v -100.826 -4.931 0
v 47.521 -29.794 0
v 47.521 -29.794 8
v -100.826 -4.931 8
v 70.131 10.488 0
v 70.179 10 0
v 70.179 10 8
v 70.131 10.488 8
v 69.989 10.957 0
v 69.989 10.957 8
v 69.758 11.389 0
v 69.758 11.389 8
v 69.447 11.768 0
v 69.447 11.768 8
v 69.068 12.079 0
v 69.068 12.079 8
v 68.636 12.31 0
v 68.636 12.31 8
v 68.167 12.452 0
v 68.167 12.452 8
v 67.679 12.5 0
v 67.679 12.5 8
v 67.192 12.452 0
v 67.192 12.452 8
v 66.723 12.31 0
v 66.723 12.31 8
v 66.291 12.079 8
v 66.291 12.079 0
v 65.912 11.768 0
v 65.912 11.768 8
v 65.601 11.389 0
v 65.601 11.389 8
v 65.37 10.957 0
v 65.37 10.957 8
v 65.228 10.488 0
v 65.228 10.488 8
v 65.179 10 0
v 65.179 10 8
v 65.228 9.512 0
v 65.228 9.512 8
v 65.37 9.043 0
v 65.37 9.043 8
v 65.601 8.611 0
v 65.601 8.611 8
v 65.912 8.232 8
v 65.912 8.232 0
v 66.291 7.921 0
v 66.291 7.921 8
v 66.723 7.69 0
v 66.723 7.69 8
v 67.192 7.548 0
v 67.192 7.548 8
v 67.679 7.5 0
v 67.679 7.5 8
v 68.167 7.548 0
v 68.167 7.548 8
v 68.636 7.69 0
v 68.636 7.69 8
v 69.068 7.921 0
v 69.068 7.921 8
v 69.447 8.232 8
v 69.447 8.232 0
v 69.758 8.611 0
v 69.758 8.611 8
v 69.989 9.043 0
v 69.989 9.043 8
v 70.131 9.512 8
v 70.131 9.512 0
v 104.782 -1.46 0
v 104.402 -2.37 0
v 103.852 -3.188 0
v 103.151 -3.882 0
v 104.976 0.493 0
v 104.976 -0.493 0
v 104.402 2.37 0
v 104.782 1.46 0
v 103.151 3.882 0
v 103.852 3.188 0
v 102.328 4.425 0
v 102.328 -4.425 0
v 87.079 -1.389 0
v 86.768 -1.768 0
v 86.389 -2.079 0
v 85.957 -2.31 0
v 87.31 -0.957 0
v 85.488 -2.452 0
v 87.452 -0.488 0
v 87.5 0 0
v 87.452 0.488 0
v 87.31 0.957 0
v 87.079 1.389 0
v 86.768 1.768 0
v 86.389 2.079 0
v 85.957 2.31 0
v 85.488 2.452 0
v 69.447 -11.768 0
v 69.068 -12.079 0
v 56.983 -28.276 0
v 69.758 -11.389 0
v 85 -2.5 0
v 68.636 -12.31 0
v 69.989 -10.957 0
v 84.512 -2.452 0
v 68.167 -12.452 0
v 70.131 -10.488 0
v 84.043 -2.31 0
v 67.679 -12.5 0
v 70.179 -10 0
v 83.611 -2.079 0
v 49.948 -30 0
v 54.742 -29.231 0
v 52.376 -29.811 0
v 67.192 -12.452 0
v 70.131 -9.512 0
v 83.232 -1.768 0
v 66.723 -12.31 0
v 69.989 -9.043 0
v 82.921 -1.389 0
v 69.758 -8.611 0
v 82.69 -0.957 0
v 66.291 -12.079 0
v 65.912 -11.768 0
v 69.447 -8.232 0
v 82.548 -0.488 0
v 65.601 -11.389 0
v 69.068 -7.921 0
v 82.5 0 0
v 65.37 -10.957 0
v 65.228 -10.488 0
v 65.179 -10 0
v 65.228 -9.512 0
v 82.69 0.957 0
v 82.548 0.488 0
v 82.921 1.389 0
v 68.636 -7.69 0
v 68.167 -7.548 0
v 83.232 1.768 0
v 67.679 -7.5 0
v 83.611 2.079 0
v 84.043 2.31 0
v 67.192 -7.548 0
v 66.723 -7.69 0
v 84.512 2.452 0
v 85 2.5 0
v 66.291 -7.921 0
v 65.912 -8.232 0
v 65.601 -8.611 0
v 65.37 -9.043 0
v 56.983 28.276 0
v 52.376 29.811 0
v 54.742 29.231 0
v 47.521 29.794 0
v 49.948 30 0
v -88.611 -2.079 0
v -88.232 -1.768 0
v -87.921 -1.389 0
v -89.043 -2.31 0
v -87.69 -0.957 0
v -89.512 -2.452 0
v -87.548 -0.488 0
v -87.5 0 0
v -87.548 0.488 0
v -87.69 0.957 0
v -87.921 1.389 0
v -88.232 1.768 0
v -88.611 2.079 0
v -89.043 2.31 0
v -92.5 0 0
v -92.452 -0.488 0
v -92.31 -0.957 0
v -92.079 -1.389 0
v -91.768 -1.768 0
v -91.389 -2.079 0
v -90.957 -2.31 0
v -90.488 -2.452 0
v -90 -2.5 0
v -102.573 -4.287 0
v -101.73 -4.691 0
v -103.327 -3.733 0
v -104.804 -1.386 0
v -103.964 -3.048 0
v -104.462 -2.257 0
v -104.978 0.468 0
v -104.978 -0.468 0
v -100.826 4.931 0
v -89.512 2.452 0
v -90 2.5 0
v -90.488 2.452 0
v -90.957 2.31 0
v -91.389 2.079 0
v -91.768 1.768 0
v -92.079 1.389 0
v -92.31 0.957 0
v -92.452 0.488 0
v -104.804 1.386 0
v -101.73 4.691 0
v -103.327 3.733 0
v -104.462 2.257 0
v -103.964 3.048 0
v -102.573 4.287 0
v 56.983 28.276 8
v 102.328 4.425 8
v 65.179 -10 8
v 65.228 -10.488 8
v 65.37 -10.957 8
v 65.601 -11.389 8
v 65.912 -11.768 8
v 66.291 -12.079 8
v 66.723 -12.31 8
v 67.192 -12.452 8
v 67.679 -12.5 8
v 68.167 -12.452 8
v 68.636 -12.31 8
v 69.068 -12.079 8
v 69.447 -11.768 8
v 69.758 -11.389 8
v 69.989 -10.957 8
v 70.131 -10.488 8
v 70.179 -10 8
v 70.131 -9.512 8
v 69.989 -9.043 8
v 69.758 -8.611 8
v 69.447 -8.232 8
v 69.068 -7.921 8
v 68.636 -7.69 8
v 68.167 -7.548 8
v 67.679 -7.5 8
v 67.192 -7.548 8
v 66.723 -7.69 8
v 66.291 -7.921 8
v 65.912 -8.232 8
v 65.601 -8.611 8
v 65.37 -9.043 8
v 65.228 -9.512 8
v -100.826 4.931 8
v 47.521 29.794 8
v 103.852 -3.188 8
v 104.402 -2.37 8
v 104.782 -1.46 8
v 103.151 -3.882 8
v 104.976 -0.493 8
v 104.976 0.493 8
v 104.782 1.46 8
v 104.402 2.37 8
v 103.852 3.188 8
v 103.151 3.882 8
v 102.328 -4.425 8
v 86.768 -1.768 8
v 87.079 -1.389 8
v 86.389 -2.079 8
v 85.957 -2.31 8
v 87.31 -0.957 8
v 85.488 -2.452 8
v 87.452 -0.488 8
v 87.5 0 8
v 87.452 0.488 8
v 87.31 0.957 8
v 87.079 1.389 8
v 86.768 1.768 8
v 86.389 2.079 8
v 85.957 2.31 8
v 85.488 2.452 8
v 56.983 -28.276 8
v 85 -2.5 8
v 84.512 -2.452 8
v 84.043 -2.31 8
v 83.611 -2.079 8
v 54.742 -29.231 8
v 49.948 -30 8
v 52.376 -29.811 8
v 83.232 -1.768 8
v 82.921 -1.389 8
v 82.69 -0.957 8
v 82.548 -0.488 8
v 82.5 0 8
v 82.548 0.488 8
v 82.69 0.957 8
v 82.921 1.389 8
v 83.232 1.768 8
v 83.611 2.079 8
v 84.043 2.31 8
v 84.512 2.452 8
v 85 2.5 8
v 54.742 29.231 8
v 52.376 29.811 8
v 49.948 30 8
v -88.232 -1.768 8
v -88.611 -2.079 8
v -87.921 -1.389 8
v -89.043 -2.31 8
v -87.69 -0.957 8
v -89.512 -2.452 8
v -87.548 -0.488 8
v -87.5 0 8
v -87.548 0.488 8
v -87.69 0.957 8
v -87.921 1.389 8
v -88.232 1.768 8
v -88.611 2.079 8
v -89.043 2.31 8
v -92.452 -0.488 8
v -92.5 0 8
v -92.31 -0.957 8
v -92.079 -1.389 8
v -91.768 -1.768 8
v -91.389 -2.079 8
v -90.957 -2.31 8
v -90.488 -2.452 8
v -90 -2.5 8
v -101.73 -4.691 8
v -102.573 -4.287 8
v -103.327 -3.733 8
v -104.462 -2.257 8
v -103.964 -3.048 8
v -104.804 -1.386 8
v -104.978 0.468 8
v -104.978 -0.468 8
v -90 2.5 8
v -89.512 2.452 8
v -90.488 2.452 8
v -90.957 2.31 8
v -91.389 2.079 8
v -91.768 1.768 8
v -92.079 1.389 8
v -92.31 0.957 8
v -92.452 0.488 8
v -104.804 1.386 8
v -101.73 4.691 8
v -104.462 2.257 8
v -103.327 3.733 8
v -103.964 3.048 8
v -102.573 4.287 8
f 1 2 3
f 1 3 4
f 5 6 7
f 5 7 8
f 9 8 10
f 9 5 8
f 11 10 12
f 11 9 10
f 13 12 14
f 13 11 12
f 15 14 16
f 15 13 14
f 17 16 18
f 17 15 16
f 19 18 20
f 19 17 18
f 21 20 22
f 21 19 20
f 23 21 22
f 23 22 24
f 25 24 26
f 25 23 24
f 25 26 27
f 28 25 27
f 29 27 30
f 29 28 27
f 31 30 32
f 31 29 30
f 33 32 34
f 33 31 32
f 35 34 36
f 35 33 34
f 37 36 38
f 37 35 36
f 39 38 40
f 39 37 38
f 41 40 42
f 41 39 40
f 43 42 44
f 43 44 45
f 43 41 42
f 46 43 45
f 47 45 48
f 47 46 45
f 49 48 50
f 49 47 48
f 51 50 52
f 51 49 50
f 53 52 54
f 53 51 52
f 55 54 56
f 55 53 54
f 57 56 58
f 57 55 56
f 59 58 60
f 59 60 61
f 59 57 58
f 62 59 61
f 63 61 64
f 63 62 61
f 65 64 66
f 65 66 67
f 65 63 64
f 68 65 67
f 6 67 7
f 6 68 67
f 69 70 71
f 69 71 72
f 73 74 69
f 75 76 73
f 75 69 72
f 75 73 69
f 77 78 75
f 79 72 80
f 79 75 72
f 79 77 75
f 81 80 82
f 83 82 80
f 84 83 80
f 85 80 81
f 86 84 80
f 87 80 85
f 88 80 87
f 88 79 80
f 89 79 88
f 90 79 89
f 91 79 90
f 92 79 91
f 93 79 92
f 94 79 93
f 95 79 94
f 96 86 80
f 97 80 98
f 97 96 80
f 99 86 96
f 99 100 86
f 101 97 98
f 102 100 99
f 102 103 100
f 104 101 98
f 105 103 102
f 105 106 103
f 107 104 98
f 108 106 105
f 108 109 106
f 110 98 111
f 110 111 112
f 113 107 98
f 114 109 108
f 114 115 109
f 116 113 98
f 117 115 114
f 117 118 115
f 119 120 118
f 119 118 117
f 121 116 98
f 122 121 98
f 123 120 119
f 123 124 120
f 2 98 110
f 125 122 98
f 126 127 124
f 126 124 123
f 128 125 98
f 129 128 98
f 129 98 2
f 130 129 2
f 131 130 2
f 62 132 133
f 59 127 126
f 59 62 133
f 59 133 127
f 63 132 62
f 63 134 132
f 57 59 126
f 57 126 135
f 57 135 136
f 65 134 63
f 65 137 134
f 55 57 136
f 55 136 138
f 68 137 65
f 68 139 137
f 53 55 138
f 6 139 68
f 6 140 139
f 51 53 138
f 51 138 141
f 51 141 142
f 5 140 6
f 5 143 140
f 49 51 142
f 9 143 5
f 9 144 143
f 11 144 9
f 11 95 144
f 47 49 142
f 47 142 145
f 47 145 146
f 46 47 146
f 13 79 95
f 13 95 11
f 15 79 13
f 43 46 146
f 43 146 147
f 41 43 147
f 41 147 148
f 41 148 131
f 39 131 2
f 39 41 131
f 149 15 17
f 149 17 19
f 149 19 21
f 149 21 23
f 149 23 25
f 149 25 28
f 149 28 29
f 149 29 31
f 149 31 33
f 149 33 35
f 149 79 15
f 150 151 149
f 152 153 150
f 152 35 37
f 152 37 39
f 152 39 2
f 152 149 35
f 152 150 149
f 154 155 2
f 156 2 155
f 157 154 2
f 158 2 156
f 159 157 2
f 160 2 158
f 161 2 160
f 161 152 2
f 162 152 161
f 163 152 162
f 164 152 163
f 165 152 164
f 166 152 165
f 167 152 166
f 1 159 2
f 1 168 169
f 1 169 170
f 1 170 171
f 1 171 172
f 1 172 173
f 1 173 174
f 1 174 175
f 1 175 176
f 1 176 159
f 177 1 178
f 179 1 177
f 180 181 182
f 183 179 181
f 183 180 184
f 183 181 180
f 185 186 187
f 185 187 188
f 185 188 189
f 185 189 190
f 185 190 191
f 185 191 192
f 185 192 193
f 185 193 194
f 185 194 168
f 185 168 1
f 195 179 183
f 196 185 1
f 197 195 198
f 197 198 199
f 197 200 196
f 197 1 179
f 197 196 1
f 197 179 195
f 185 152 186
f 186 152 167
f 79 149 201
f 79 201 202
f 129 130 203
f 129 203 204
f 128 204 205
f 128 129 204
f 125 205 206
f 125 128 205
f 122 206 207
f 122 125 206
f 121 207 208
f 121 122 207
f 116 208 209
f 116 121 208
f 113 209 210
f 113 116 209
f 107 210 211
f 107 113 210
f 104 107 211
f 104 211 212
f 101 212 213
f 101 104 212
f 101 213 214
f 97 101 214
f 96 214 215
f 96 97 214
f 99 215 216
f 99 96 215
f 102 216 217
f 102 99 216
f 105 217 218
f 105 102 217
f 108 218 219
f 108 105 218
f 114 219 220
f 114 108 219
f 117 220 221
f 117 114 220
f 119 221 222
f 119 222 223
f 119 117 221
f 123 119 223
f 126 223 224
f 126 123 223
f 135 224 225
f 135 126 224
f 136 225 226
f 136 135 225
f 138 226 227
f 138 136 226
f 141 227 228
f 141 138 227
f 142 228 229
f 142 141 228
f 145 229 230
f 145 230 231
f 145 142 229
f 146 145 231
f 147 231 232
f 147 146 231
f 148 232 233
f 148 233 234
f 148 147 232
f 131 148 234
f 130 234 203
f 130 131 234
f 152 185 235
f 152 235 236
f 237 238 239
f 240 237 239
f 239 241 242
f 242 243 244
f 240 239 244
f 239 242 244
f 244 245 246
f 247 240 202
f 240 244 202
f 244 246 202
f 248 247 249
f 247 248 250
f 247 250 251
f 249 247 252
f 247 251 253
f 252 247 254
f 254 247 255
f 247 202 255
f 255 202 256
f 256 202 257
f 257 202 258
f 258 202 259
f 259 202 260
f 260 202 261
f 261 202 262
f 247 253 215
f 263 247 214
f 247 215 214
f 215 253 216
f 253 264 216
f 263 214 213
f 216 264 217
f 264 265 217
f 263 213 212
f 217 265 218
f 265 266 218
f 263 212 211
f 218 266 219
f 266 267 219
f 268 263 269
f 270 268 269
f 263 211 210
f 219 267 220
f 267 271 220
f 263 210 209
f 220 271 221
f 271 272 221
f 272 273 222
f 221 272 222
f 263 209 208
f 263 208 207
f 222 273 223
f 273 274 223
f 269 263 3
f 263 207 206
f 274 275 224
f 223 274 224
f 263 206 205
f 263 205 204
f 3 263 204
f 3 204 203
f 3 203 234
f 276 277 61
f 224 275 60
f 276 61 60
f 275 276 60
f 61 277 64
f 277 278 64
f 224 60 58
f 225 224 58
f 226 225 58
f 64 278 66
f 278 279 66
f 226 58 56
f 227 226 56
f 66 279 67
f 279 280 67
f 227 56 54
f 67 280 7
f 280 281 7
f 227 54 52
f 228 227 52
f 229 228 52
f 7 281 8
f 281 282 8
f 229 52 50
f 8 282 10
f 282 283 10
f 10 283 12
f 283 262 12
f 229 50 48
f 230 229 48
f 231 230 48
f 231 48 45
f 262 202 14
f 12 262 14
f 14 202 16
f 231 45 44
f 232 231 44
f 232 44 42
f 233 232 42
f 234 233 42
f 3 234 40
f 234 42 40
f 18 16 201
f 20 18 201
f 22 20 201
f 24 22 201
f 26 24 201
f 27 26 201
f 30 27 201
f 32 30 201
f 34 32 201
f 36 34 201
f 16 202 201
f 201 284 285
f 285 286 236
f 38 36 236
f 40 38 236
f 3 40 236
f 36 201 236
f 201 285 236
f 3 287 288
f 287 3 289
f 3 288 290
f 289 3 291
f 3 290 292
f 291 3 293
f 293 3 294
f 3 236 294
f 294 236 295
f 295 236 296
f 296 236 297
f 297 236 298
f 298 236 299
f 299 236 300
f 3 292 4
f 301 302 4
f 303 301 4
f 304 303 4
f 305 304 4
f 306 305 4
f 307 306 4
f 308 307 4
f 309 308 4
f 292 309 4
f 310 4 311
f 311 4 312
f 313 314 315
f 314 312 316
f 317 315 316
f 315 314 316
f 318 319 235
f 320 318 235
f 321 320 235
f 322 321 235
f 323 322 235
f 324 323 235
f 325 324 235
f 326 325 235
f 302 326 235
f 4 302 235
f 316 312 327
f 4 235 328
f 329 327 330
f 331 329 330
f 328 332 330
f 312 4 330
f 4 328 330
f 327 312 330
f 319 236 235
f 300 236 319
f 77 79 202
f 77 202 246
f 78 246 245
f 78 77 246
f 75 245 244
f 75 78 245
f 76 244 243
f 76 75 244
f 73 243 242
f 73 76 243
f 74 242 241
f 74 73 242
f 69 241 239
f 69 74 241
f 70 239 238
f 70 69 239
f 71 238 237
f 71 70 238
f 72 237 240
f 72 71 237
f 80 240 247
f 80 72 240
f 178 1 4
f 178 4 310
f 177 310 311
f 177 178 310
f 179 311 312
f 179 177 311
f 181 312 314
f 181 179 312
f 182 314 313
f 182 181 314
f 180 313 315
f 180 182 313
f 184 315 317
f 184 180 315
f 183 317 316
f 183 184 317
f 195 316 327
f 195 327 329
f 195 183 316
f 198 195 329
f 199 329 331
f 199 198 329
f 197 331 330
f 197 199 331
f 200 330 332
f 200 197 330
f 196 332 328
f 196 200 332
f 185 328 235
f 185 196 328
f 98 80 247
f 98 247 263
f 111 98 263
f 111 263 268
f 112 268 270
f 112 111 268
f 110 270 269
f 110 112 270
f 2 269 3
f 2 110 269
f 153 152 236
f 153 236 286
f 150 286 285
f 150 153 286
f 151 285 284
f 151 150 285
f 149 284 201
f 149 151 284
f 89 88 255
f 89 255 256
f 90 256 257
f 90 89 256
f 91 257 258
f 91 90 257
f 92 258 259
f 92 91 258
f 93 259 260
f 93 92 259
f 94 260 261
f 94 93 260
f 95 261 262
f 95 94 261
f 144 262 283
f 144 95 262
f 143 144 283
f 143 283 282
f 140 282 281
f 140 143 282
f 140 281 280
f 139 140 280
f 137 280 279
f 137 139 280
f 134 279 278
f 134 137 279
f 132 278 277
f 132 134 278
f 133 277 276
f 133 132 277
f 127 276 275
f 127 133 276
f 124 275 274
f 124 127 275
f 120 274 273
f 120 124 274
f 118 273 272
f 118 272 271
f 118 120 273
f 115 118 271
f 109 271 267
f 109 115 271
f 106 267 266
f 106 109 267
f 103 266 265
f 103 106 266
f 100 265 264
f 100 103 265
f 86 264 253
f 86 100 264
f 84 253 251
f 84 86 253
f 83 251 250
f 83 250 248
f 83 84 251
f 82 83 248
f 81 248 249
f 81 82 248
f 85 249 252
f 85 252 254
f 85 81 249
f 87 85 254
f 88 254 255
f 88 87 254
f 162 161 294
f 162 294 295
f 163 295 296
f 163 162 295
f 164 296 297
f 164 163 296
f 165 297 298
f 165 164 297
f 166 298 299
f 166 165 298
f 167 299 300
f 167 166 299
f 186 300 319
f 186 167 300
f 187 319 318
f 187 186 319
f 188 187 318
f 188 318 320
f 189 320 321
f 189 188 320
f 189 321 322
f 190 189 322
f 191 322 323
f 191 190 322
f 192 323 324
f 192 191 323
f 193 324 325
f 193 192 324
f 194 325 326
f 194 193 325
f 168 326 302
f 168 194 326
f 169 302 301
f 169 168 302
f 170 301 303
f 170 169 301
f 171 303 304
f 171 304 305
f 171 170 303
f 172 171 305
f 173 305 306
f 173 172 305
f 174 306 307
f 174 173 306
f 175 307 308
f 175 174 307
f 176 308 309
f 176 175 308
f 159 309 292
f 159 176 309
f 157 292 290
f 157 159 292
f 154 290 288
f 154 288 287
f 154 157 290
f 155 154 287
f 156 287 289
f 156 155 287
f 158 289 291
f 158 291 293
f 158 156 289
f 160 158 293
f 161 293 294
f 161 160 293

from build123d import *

# Parameters (mm, degrees)
SKETCH_1_R      = 2.5
EXTRUDE_1_DEPTH = 8


with BuildPart() as part:
    # 草图1 → 凸台-拉伸1 (new body)
    with BuildSketch(Plane.XY):
        with BuildLine():
            Line((-100.826455741, 4.931224078), (47.520632777, 29.793672234))
            ThreePointArc((47.520632777, 29.793672234), (52.376150378, 29.81060125), (56.982686096, 28.27562032))
            Line((56.982686096, 28.27562032), (102.327562032, 4.425206773))
            ThreePointArc((102.327562032, 4.425206773), (105, 0), (102.327562032, -4.425206773))
            Line((102.327562032, -4.425206773), (56.982686096, -28.27562032))
            ThreePointArc((56.982686096, -28.27562032), (52.376150378, -29.81060125), (47.520632777, -29.793672234))
            Line((47.520632777, -29.793672234), (-100.826455741, -4.931224078))
            ThreePointArc((-100.826455741, -4.931224078), (-105, 0), (-100.826455741, 4.931224078))
        make_face()
        with Locations((85, 0)):
            Circle(SKETCH_1_R, mode=Mode.SUBTRACT)
        with Locations((67.679491924, 10)):
            Circle(SKETCH_1_R, mode=Mode.SUBTRACT)
        with Locations(Location((67.679491924, -10, 0), (0, 0, 180))):
            Circle(SKETCH_1_R, mode=Mode.SUBTRACT)
        with Locations((-90, 0)):
            Circle(SKETCH_1_R, mode=Mode.SUBTRACT)
    extrude(amount=EXTRUDE_1_DEPTH)


solid = part.part
